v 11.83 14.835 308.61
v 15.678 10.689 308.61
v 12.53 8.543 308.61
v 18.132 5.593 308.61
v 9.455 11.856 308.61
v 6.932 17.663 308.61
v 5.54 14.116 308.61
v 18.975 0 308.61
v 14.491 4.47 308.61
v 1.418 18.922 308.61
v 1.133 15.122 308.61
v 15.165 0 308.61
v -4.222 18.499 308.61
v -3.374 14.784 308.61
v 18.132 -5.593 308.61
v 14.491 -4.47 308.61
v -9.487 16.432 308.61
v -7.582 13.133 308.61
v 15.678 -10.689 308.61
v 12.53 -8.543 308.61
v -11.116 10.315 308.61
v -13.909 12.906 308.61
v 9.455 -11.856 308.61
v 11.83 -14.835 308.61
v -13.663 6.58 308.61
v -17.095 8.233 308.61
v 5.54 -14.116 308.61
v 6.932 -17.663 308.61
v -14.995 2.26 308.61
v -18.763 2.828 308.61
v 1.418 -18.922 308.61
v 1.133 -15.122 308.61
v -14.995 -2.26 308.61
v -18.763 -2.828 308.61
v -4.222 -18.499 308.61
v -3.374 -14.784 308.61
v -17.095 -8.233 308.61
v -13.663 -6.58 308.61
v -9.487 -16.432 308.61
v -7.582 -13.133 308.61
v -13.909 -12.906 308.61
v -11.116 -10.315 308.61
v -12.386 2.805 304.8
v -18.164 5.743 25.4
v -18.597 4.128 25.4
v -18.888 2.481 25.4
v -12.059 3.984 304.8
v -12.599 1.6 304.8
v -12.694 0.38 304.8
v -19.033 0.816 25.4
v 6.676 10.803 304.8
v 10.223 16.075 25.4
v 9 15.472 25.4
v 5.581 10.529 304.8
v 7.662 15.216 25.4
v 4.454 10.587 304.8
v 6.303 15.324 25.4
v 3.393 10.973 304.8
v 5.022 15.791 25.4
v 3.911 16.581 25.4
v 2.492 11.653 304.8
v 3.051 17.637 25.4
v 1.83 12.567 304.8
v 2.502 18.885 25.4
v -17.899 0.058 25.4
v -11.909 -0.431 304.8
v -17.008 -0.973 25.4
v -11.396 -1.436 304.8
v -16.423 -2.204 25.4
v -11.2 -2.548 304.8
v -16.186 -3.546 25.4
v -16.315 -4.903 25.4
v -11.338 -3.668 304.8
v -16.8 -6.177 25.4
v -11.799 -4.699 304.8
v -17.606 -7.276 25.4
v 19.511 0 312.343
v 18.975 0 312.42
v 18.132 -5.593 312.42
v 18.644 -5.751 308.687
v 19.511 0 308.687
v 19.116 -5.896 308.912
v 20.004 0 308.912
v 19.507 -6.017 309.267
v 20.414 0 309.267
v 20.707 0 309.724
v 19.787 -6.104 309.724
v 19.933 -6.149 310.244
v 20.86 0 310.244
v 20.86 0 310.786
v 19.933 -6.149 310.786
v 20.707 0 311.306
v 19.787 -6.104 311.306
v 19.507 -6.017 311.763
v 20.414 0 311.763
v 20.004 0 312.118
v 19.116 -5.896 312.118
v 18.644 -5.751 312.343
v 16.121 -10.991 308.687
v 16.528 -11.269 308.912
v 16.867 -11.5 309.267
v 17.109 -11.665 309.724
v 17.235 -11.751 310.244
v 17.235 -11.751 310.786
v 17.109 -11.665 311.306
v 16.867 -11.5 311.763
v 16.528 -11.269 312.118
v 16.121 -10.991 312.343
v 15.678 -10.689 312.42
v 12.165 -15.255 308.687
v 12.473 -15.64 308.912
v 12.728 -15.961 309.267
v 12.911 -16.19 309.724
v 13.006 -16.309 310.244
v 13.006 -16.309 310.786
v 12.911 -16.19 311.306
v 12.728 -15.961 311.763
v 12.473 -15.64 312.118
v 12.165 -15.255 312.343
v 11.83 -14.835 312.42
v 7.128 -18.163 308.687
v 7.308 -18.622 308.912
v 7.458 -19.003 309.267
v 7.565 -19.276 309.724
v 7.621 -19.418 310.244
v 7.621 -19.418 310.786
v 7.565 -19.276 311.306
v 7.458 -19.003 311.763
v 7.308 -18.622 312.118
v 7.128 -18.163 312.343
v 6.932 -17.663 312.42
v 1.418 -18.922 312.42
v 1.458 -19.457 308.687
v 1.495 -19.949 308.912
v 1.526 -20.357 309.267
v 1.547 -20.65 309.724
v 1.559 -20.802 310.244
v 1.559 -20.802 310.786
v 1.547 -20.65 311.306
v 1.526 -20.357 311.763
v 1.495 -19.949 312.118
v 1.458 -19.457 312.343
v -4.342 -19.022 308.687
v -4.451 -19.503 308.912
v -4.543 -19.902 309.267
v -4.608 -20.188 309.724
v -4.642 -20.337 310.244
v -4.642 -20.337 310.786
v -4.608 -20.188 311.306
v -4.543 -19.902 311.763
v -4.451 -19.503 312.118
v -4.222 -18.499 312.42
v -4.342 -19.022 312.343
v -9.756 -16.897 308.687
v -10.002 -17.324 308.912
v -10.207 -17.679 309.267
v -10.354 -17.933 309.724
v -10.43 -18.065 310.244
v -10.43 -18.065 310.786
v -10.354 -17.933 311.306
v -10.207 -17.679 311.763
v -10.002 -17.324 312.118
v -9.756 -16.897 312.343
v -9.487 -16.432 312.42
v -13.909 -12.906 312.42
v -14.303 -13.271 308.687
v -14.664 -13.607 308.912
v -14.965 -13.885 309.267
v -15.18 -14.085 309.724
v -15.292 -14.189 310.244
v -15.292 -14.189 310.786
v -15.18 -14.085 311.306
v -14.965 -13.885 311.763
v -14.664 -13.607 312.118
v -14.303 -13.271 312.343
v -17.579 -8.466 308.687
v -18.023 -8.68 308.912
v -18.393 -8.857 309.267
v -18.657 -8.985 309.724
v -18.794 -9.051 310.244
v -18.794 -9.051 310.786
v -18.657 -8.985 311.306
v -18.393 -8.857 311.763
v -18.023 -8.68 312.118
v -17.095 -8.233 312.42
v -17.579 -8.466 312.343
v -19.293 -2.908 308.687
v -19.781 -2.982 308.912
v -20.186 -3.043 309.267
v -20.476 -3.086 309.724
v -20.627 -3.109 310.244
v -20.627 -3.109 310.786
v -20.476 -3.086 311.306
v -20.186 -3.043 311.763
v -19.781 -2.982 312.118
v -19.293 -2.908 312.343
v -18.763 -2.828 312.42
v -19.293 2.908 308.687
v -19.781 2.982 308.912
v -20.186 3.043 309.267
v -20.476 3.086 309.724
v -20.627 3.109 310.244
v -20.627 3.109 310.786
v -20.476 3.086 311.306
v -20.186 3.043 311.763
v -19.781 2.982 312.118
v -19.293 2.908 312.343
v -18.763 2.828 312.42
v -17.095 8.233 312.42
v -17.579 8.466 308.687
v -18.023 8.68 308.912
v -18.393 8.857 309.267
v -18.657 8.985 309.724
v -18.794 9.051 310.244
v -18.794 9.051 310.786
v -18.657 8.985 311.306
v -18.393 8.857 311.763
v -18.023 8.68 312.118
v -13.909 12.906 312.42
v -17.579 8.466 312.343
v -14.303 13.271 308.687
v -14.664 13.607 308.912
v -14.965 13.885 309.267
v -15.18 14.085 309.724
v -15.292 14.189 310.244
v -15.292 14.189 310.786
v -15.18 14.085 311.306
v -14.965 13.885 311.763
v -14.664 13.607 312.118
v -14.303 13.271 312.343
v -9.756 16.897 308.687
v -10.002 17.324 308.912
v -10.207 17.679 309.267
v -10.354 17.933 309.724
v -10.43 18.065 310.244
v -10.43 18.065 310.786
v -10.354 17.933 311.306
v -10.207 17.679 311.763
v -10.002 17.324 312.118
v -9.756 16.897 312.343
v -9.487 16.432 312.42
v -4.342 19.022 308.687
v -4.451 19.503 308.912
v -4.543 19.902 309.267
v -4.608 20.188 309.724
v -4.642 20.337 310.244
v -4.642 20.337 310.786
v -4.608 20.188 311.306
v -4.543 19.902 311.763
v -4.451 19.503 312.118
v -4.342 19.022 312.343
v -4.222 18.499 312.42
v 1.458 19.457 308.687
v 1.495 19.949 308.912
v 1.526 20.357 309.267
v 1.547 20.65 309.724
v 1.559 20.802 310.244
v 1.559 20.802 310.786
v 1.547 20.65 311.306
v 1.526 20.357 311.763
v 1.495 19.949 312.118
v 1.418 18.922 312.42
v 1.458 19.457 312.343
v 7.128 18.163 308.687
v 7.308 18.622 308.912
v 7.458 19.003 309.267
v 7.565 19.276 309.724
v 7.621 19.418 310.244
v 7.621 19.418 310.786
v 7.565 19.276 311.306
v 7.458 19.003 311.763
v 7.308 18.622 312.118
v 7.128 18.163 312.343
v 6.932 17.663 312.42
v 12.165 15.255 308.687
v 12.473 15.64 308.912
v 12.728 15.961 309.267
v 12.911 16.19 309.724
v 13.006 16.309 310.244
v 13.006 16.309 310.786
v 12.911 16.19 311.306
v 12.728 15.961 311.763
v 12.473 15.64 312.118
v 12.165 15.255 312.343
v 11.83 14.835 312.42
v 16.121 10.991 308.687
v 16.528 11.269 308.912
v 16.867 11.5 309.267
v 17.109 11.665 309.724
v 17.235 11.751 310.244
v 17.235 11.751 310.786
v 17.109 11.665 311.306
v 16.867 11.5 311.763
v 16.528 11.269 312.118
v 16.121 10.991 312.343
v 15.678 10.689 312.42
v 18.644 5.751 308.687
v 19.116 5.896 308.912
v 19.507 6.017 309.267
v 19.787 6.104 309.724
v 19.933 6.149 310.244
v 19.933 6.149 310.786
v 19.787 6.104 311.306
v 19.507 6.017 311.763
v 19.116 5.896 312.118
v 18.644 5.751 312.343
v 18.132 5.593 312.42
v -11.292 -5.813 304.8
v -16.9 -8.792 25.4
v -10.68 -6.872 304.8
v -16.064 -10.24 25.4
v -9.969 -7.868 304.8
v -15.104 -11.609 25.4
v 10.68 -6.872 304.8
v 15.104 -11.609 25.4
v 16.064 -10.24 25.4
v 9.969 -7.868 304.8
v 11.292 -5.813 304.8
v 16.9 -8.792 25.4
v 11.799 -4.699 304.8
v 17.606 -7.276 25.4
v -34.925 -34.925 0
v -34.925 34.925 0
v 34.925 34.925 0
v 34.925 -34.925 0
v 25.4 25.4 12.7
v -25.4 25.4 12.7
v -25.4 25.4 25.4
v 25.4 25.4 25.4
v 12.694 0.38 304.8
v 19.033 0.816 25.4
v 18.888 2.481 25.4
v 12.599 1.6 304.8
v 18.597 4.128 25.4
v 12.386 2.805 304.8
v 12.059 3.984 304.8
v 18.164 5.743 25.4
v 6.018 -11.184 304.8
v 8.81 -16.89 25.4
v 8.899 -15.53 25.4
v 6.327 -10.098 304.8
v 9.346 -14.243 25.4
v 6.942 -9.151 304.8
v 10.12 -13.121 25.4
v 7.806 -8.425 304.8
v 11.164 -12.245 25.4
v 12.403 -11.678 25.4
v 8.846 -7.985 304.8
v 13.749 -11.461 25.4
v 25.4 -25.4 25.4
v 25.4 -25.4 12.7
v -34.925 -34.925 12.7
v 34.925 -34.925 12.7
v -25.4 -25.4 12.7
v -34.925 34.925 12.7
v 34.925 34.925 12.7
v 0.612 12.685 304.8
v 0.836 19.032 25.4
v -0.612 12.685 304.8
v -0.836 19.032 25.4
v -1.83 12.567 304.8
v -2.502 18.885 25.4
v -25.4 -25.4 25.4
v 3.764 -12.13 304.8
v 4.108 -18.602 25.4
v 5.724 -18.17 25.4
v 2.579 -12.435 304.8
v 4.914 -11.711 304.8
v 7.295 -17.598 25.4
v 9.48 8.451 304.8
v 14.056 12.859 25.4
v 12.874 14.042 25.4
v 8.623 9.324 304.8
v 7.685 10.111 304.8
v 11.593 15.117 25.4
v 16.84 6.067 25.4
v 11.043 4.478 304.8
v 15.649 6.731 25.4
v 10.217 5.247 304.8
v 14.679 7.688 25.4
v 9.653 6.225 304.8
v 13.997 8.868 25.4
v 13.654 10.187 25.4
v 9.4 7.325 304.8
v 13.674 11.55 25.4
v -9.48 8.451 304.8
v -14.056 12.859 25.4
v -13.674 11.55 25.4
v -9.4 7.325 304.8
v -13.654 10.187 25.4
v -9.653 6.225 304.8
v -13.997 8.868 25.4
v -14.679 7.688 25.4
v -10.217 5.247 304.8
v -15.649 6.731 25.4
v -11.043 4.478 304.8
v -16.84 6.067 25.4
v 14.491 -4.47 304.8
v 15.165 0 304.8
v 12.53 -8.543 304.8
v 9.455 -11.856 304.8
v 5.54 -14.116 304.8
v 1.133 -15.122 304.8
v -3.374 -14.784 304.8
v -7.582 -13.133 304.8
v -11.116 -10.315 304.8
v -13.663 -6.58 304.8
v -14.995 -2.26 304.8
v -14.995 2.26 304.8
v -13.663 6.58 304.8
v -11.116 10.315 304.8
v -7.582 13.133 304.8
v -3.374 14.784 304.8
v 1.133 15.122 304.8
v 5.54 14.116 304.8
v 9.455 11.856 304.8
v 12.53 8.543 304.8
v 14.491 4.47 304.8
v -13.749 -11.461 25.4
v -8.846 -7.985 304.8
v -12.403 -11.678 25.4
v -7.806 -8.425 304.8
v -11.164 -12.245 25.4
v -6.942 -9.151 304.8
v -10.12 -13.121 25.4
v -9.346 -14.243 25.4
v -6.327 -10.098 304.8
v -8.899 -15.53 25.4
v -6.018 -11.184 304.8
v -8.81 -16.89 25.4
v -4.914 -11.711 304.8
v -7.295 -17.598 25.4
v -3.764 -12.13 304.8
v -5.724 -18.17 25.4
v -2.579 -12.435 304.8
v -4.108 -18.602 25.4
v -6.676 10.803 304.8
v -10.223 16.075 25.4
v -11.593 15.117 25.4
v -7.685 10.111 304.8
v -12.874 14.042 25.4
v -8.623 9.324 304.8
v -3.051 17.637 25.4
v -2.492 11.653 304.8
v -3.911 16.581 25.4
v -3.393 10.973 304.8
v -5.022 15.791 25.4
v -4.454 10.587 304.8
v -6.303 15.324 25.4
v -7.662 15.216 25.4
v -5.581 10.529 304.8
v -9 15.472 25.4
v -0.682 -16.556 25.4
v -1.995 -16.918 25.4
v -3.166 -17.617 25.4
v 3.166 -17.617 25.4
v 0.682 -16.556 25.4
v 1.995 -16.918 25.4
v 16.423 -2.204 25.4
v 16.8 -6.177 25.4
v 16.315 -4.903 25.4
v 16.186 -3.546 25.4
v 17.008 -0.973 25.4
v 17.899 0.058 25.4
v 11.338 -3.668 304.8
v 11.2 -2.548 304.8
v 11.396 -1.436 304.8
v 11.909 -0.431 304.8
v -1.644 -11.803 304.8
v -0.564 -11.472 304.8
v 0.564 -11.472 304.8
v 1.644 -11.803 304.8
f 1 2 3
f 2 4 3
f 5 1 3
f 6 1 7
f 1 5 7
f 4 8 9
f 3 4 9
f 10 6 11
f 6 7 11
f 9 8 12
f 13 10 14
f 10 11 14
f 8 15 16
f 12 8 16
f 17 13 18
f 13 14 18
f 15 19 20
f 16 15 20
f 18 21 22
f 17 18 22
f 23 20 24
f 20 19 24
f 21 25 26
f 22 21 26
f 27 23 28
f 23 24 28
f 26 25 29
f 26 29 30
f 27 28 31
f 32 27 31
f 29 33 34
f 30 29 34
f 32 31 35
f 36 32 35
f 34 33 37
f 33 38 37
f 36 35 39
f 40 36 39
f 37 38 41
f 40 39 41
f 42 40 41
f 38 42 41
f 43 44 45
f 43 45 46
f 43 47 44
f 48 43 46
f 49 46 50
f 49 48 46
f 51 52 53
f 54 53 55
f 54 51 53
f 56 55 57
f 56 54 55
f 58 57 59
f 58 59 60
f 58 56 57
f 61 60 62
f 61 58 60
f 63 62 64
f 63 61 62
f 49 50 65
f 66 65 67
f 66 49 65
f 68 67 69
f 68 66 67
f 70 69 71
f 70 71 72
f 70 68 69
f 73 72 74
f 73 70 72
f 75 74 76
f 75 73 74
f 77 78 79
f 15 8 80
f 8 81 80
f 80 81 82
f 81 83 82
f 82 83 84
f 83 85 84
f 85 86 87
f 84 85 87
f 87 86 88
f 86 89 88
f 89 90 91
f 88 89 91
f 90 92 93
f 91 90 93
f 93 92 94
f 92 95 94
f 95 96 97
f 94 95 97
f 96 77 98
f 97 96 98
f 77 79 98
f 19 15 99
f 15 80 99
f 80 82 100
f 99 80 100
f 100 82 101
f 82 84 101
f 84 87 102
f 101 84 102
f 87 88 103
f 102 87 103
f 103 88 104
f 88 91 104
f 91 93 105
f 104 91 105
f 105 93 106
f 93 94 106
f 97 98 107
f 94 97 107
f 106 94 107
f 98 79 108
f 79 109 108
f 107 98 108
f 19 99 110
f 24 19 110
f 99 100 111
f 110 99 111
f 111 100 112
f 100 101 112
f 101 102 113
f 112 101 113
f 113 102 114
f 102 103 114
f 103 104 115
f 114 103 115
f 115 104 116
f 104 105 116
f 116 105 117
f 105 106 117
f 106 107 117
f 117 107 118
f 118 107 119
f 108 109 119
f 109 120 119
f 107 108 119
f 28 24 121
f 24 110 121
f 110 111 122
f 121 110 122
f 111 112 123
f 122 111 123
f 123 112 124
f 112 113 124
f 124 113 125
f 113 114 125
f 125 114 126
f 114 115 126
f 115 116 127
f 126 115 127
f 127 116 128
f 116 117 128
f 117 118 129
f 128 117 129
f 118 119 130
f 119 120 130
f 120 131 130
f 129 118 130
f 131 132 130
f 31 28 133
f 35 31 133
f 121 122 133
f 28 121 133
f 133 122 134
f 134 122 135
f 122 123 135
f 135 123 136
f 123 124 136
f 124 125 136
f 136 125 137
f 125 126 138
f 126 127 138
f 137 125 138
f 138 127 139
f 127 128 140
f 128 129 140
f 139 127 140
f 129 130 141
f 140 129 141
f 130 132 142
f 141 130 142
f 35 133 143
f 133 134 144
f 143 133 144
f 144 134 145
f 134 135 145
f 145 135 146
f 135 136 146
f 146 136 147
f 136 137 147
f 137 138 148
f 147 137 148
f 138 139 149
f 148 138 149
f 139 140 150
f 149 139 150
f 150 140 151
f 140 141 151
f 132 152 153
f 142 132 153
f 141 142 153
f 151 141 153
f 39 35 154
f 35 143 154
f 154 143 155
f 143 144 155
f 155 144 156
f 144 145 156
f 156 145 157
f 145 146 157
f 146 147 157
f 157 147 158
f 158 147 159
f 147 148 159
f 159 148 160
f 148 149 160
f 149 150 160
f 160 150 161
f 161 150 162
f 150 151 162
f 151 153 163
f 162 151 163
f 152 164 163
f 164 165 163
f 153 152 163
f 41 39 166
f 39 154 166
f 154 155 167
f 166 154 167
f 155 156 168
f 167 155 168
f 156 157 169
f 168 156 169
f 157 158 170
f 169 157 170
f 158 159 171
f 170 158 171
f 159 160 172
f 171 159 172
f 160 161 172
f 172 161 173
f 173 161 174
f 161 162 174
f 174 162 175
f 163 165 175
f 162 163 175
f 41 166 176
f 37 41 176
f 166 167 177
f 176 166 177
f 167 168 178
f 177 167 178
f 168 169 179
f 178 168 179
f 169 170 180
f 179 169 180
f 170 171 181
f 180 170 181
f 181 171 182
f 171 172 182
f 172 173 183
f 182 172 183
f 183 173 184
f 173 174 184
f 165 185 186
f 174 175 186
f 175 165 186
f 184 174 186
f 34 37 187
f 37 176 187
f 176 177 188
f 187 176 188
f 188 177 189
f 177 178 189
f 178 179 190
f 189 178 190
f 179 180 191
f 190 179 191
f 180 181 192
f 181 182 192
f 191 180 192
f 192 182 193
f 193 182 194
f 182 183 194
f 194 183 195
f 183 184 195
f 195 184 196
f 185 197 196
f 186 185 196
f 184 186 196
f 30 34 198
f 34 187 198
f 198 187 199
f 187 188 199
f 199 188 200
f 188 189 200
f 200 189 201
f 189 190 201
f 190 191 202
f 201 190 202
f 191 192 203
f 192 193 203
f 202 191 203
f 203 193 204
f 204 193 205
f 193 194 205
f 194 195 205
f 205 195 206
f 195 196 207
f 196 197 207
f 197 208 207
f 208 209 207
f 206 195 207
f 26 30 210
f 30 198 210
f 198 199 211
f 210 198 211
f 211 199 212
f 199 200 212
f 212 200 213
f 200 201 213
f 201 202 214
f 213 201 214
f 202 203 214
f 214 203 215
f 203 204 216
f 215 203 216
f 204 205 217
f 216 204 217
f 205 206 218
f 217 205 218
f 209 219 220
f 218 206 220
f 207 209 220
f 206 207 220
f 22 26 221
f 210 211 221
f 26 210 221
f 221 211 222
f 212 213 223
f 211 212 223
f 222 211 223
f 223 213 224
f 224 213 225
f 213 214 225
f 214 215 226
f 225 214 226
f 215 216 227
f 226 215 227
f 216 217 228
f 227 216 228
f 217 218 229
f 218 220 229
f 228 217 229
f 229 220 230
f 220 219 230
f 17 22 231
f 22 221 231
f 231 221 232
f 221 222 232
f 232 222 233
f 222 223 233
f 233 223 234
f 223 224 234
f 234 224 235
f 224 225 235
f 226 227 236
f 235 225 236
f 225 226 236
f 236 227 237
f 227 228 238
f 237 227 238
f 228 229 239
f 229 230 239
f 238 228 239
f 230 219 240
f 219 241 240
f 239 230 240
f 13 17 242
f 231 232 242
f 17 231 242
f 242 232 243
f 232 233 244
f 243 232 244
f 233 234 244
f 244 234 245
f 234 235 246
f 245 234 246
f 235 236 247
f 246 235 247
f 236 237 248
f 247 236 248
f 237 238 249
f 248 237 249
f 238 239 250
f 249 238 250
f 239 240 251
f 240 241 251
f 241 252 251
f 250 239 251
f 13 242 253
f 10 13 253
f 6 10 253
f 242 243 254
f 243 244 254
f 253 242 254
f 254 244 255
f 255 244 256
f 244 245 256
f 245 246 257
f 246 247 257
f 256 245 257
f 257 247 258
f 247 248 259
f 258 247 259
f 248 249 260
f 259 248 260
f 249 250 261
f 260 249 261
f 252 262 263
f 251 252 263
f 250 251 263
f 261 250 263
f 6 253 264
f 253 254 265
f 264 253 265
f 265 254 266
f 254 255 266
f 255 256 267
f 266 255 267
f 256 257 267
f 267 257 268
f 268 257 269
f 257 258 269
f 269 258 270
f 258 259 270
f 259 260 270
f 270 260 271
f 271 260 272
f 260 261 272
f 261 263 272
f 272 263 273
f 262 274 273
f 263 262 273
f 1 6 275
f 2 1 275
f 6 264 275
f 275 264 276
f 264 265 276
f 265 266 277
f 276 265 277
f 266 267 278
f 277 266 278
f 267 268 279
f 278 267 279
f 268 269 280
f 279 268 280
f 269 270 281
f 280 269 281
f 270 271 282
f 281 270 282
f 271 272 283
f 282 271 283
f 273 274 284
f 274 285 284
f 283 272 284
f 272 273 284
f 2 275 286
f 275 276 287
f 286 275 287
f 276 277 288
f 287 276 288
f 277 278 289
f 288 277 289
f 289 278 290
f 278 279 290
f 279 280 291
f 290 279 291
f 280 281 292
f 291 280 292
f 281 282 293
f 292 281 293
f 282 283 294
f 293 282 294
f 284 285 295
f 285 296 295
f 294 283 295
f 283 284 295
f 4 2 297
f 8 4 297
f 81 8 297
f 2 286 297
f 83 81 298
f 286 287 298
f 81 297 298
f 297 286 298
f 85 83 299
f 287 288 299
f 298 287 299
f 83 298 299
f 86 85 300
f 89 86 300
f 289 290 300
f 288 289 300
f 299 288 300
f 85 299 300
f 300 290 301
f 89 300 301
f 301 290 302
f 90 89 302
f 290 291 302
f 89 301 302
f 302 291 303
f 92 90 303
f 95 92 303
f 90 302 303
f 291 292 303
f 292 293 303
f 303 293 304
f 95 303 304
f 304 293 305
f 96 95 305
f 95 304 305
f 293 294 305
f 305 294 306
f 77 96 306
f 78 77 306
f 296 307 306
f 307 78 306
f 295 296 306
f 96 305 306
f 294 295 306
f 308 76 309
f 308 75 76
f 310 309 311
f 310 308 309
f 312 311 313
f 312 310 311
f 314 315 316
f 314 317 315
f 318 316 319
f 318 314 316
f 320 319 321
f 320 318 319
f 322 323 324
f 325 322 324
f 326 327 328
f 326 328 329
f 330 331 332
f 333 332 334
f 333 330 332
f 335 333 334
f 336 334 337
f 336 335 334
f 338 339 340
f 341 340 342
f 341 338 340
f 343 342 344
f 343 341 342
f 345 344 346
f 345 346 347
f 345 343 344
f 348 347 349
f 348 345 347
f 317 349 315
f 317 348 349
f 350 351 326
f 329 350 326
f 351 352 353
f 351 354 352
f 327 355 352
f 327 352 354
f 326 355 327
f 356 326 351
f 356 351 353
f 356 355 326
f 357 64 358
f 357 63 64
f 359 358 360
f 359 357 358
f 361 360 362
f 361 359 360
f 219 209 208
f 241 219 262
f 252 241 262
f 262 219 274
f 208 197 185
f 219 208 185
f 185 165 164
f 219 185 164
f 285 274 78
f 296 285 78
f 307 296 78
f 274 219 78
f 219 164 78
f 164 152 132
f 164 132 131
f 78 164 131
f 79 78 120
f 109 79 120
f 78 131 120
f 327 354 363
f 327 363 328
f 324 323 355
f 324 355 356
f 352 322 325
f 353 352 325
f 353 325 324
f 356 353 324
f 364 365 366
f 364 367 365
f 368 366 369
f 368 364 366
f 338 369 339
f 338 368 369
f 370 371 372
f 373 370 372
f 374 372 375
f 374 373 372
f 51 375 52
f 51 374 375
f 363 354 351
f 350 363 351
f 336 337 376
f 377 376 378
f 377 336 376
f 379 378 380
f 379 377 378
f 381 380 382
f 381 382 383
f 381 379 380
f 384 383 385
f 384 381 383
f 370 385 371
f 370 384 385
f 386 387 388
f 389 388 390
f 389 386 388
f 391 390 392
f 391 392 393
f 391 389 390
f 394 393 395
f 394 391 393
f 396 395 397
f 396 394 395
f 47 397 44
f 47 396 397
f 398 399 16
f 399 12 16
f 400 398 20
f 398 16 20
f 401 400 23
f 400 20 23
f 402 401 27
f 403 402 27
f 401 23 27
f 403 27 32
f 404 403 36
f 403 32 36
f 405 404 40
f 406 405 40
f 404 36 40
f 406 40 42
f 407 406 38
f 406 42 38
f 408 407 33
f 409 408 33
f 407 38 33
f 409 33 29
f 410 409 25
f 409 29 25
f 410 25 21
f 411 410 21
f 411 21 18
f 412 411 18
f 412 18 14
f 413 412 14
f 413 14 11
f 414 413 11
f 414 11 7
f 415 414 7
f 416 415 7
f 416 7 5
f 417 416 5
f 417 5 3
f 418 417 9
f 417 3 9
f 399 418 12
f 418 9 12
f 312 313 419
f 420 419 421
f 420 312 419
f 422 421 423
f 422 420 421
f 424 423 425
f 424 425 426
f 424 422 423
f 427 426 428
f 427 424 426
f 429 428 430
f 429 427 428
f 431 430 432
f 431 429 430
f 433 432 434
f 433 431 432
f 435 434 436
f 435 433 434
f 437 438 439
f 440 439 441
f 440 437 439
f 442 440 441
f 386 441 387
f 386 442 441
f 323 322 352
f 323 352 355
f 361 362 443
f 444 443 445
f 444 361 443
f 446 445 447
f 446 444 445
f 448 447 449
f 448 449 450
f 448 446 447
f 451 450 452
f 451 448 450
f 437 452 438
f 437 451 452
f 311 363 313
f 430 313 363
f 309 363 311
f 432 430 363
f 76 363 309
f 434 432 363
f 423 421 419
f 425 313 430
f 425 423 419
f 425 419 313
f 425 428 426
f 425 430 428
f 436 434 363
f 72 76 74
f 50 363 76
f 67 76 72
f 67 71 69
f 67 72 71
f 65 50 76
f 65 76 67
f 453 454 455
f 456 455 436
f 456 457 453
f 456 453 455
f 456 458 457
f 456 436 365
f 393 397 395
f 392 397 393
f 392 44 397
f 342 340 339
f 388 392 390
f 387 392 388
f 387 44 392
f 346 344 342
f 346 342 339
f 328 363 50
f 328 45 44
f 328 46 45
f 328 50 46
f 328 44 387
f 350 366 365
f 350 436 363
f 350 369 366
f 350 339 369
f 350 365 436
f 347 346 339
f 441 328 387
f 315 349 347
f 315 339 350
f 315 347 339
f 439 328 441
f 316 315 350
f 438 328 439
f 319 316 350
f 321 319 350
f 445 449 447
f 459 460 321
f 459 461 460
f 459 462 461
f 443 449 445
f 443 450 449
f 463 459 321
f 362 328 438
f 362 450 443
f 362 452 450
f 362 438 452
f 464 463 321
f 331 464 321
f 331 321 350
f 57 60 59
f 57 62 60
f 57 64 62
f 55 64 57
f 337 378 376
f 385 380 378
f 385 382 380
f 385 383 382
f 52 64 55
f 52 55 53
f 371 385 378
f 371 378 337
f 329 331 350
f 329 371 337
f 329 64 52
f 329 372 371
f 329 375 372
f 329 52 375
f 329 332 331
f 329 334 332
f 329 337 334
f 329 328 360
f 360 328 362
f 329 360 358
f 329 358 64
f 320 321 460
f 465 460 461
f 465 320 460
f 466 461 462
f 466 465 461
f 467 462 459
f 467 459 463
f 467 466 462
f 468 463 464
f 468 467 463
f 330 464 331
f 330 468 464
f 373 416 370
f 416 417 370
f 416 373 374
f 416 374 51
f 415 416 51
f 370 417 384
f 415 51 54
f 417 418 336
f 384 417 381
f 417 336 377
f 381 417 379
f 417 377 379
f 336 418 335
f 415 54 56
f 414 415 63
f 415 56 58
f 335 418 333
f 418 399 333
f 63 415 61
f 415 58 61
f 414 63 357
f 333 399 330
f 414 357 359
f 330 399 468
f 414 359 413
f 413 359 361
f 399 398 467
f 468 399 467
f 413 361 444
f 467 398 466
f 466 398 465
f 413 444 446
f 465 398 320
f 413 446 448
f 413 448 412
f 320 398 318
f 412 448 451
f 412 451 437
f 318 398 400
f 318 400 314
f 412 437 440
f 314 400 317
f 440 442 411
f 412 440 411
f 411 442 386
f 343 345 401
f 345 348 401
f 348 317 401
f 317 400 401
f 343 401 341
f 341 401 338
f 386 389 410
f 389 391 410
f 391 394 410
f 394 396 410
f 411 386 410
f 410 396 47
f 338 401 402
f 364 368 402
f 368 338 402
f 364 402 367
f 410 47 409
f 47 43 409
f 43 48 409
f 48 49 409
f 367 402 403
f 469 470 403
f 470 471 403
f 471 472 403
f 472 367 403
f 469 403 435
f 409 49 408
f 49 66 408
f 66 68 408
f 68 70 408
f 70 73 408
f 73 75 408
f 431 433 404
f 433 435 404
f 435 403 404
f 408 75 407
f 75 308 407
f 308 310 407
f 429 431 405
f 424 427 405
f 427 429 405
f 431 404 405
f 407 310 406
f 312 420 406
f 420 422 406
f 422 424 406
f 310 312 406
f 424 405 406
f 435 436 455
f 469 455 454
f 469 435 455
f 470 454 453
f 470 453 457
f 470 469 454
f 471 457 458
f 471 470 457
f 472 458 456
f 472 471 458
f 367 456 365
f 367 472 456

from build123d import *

# Parameters (mm, degrees)
F0_W     = 69.85
F0_H     = 69.85
F1_DEPTH = 12.7
F2_W     = 50.8
F2_H     = 50.8
F3_DEPTH = 12.7


with BuildPart() as f1:
    # F0 (on Top) → F1 (new body)
    with BuildSketch(Plane.XY):
        Rectangle(F0_W, F0_H)
    extrude(amount=F1_DEPTH)

    # F2 (on face) → F3 (join)
    with BuildSketch(Plane.XY.offset(12.7)):
        Rectangle(F2_W, F2_H)
    extrude(amount=F3_DEPTH)

    # F4 (on face) → F7 section 0
    with BuildSketch(Plane.XY.offset(25.4)):
        with BuildLine():
            ThreePointArc((17.60579, -7.275895), (16.259176, -2.866931), (19.032534, 0.81557))
            ThreePointArc((19.032534, 0.81557), (18.760588, 3.307998), (18.163673, 5.743125))
            ThreePointArc((18.163673, 5.743125), (14.298079, 8.255), (14.055529, 12.85864))
            ThreePointArc((14.055529, 12.85864), (12.245104, 14.593147), (10.222571, 16.074873))
            ThreePointArc((10.222571, 16.074873), (5.646753, 15.514325), (2.501785, 18.885009))
            ThreePointArc((2.501785, 18.885009), (0, 19.05), (-2.501785, 18.885009))
            ThreePointArc((-2.501785, 18.885009), (-5.646753, 15.514325), (-10.222571, 16.074873))
            ThreePointArc((-10.222571, 16.074873), (-12.245104, 14.593147), (-14.055529, 12.85864))
            ThreePointArc((-14.055529, 12.85864), (-14.298079, 8.255), (-18.163673, 5.743125))
            ThreePointArc((-18.163673, 5.743125), (-18.760588, 3.307998), (-19.032534, 0.81557))
            ThreePointArc((-19.032534, 0.81557), (-16.259176, -2.866931), (-17.60579, -7.275895))
            ThreePointArc((-17.60579, -7.275895), (-16.497784, -9.525), (-15.104005, -11.609114))
            ThreePointArc((-15.104005, -11.609114), (-10.612423, -12.647394), (-8.809963, -16.890443))
            ThreePointArc((-8.809963, -16.890443), (-6.515484, -17.901144), (-4.108144, -18.601765))
            ThreePointArc((-4.108144, -18.601765), (0, -16.51), (4.108144, -18.601765))
            ThreePointArc((4.108144, -18.601765), (6.515484, -17.901144), (8.809963, -16.890443))
            ThreePointArc((8.809963, -16.890443), (10.612423, -12.647394), (15.104005, -11.609114))
            ThreePointArc((15.104005, -11.609114), (16.497784, -9.525), (17.60579, -7.275895))
        make_face()
    # F6 (on offset) → F7 section 1
    with BuildSketch(Plane.XY.offset(304.8)):
        with BuildLine():
            ThreePointArc((11.798684, -4.699048), (11.256353, -1.984799), (12.694305, 0.380274))
            ThreePointArc((12.694305, 0.380274), (12.507058, 2.205332), (12.058806, 3.984368))
            ThreePointArc((12.058806, 3.984368), (9.89867, 5.715), (9.479967, 8.451049))
            ThreePointArc((9.479967, 8.451049), (8.163403, 9.728764), (6.676479, 10.803454))
            ThreePointArc((6.676479, 10.803454), (3.90929, 10.740687), (1.829847, 12.567484))
            ThreePointArc((1.829847, 12.567484), (0, 12.7), (-1.829847, 12.567484))
            ThreePointArc((-1.829847, 12.567484), (-3.90929, 10.740687), (-6.676479, 10.803454))
            ThreePointArc((-6.676479, 10.803454), (-8.163403, 9.728764), (-9.479967, 8.451049))
            ThreePointArc((-9.479967, 8.451049), (-9.89867, 5.715), (-12.058806, 3.984368))
            ThreePointArc((-12.058806, 3.984368), (-12.507058, 2.205332), (-12.694305, 0.380274))
            ThreePointArc((-12.694305, 0.380274), (-11.256353, -1.984799), (-11.798684, -4.699048))
            ThreePointArc((-11.798684, -4.699048), (-10.998523, -6.35), (-9.968837, -7.868436))
            ThreePointArc((-9.968837, -7.868436), (-7.347062, -8.755888), (-6.017826, -11.183728))
            ThreePointArc((-6.017826, -11.183728), (-4.343656, -11.934096), (-2.578839, -12.435417))
            ThreePointArc((-2.578839, -12.435417), (0, -11.43), (2.578839, -12.435417))
            ThreePointArc((2.578839, -12.435417), (4.343656, -11.934096), (6.017826, -11.183728))
            ThreePointArc((6.017826, -11.183728), (7.347062, -8.755888), (9.968837, -7.868436))
            ThreePointArc((9.968837, -7.868436), (10.998523, -6.35), (11.798684, -4.699048))
        make_face()
    loft()

    # F9 (on Front) → F10 (revolve)
    with BuildSketch(Plane.XZ):
        with BuildLine():
            Line((0, 304.8), (15.164565, 304.8))
            Line((15.164565, 304.8), (15.164565, 308.61))
            Line((15.164565, 308.61), (18.974565, 308.61))
            ThreePointArc((18.974565, 308.61), (20.879565, 310.515), (18.974565, 312.42))
            Line((18.974565, 312.42), (0, 312.42))
            Line((0, 312.42), (0, 304.8))
        make_face()
    revolve(axis=Axis((0, 0, 308.61), (0, 0, -1)))


solid = f1.part
